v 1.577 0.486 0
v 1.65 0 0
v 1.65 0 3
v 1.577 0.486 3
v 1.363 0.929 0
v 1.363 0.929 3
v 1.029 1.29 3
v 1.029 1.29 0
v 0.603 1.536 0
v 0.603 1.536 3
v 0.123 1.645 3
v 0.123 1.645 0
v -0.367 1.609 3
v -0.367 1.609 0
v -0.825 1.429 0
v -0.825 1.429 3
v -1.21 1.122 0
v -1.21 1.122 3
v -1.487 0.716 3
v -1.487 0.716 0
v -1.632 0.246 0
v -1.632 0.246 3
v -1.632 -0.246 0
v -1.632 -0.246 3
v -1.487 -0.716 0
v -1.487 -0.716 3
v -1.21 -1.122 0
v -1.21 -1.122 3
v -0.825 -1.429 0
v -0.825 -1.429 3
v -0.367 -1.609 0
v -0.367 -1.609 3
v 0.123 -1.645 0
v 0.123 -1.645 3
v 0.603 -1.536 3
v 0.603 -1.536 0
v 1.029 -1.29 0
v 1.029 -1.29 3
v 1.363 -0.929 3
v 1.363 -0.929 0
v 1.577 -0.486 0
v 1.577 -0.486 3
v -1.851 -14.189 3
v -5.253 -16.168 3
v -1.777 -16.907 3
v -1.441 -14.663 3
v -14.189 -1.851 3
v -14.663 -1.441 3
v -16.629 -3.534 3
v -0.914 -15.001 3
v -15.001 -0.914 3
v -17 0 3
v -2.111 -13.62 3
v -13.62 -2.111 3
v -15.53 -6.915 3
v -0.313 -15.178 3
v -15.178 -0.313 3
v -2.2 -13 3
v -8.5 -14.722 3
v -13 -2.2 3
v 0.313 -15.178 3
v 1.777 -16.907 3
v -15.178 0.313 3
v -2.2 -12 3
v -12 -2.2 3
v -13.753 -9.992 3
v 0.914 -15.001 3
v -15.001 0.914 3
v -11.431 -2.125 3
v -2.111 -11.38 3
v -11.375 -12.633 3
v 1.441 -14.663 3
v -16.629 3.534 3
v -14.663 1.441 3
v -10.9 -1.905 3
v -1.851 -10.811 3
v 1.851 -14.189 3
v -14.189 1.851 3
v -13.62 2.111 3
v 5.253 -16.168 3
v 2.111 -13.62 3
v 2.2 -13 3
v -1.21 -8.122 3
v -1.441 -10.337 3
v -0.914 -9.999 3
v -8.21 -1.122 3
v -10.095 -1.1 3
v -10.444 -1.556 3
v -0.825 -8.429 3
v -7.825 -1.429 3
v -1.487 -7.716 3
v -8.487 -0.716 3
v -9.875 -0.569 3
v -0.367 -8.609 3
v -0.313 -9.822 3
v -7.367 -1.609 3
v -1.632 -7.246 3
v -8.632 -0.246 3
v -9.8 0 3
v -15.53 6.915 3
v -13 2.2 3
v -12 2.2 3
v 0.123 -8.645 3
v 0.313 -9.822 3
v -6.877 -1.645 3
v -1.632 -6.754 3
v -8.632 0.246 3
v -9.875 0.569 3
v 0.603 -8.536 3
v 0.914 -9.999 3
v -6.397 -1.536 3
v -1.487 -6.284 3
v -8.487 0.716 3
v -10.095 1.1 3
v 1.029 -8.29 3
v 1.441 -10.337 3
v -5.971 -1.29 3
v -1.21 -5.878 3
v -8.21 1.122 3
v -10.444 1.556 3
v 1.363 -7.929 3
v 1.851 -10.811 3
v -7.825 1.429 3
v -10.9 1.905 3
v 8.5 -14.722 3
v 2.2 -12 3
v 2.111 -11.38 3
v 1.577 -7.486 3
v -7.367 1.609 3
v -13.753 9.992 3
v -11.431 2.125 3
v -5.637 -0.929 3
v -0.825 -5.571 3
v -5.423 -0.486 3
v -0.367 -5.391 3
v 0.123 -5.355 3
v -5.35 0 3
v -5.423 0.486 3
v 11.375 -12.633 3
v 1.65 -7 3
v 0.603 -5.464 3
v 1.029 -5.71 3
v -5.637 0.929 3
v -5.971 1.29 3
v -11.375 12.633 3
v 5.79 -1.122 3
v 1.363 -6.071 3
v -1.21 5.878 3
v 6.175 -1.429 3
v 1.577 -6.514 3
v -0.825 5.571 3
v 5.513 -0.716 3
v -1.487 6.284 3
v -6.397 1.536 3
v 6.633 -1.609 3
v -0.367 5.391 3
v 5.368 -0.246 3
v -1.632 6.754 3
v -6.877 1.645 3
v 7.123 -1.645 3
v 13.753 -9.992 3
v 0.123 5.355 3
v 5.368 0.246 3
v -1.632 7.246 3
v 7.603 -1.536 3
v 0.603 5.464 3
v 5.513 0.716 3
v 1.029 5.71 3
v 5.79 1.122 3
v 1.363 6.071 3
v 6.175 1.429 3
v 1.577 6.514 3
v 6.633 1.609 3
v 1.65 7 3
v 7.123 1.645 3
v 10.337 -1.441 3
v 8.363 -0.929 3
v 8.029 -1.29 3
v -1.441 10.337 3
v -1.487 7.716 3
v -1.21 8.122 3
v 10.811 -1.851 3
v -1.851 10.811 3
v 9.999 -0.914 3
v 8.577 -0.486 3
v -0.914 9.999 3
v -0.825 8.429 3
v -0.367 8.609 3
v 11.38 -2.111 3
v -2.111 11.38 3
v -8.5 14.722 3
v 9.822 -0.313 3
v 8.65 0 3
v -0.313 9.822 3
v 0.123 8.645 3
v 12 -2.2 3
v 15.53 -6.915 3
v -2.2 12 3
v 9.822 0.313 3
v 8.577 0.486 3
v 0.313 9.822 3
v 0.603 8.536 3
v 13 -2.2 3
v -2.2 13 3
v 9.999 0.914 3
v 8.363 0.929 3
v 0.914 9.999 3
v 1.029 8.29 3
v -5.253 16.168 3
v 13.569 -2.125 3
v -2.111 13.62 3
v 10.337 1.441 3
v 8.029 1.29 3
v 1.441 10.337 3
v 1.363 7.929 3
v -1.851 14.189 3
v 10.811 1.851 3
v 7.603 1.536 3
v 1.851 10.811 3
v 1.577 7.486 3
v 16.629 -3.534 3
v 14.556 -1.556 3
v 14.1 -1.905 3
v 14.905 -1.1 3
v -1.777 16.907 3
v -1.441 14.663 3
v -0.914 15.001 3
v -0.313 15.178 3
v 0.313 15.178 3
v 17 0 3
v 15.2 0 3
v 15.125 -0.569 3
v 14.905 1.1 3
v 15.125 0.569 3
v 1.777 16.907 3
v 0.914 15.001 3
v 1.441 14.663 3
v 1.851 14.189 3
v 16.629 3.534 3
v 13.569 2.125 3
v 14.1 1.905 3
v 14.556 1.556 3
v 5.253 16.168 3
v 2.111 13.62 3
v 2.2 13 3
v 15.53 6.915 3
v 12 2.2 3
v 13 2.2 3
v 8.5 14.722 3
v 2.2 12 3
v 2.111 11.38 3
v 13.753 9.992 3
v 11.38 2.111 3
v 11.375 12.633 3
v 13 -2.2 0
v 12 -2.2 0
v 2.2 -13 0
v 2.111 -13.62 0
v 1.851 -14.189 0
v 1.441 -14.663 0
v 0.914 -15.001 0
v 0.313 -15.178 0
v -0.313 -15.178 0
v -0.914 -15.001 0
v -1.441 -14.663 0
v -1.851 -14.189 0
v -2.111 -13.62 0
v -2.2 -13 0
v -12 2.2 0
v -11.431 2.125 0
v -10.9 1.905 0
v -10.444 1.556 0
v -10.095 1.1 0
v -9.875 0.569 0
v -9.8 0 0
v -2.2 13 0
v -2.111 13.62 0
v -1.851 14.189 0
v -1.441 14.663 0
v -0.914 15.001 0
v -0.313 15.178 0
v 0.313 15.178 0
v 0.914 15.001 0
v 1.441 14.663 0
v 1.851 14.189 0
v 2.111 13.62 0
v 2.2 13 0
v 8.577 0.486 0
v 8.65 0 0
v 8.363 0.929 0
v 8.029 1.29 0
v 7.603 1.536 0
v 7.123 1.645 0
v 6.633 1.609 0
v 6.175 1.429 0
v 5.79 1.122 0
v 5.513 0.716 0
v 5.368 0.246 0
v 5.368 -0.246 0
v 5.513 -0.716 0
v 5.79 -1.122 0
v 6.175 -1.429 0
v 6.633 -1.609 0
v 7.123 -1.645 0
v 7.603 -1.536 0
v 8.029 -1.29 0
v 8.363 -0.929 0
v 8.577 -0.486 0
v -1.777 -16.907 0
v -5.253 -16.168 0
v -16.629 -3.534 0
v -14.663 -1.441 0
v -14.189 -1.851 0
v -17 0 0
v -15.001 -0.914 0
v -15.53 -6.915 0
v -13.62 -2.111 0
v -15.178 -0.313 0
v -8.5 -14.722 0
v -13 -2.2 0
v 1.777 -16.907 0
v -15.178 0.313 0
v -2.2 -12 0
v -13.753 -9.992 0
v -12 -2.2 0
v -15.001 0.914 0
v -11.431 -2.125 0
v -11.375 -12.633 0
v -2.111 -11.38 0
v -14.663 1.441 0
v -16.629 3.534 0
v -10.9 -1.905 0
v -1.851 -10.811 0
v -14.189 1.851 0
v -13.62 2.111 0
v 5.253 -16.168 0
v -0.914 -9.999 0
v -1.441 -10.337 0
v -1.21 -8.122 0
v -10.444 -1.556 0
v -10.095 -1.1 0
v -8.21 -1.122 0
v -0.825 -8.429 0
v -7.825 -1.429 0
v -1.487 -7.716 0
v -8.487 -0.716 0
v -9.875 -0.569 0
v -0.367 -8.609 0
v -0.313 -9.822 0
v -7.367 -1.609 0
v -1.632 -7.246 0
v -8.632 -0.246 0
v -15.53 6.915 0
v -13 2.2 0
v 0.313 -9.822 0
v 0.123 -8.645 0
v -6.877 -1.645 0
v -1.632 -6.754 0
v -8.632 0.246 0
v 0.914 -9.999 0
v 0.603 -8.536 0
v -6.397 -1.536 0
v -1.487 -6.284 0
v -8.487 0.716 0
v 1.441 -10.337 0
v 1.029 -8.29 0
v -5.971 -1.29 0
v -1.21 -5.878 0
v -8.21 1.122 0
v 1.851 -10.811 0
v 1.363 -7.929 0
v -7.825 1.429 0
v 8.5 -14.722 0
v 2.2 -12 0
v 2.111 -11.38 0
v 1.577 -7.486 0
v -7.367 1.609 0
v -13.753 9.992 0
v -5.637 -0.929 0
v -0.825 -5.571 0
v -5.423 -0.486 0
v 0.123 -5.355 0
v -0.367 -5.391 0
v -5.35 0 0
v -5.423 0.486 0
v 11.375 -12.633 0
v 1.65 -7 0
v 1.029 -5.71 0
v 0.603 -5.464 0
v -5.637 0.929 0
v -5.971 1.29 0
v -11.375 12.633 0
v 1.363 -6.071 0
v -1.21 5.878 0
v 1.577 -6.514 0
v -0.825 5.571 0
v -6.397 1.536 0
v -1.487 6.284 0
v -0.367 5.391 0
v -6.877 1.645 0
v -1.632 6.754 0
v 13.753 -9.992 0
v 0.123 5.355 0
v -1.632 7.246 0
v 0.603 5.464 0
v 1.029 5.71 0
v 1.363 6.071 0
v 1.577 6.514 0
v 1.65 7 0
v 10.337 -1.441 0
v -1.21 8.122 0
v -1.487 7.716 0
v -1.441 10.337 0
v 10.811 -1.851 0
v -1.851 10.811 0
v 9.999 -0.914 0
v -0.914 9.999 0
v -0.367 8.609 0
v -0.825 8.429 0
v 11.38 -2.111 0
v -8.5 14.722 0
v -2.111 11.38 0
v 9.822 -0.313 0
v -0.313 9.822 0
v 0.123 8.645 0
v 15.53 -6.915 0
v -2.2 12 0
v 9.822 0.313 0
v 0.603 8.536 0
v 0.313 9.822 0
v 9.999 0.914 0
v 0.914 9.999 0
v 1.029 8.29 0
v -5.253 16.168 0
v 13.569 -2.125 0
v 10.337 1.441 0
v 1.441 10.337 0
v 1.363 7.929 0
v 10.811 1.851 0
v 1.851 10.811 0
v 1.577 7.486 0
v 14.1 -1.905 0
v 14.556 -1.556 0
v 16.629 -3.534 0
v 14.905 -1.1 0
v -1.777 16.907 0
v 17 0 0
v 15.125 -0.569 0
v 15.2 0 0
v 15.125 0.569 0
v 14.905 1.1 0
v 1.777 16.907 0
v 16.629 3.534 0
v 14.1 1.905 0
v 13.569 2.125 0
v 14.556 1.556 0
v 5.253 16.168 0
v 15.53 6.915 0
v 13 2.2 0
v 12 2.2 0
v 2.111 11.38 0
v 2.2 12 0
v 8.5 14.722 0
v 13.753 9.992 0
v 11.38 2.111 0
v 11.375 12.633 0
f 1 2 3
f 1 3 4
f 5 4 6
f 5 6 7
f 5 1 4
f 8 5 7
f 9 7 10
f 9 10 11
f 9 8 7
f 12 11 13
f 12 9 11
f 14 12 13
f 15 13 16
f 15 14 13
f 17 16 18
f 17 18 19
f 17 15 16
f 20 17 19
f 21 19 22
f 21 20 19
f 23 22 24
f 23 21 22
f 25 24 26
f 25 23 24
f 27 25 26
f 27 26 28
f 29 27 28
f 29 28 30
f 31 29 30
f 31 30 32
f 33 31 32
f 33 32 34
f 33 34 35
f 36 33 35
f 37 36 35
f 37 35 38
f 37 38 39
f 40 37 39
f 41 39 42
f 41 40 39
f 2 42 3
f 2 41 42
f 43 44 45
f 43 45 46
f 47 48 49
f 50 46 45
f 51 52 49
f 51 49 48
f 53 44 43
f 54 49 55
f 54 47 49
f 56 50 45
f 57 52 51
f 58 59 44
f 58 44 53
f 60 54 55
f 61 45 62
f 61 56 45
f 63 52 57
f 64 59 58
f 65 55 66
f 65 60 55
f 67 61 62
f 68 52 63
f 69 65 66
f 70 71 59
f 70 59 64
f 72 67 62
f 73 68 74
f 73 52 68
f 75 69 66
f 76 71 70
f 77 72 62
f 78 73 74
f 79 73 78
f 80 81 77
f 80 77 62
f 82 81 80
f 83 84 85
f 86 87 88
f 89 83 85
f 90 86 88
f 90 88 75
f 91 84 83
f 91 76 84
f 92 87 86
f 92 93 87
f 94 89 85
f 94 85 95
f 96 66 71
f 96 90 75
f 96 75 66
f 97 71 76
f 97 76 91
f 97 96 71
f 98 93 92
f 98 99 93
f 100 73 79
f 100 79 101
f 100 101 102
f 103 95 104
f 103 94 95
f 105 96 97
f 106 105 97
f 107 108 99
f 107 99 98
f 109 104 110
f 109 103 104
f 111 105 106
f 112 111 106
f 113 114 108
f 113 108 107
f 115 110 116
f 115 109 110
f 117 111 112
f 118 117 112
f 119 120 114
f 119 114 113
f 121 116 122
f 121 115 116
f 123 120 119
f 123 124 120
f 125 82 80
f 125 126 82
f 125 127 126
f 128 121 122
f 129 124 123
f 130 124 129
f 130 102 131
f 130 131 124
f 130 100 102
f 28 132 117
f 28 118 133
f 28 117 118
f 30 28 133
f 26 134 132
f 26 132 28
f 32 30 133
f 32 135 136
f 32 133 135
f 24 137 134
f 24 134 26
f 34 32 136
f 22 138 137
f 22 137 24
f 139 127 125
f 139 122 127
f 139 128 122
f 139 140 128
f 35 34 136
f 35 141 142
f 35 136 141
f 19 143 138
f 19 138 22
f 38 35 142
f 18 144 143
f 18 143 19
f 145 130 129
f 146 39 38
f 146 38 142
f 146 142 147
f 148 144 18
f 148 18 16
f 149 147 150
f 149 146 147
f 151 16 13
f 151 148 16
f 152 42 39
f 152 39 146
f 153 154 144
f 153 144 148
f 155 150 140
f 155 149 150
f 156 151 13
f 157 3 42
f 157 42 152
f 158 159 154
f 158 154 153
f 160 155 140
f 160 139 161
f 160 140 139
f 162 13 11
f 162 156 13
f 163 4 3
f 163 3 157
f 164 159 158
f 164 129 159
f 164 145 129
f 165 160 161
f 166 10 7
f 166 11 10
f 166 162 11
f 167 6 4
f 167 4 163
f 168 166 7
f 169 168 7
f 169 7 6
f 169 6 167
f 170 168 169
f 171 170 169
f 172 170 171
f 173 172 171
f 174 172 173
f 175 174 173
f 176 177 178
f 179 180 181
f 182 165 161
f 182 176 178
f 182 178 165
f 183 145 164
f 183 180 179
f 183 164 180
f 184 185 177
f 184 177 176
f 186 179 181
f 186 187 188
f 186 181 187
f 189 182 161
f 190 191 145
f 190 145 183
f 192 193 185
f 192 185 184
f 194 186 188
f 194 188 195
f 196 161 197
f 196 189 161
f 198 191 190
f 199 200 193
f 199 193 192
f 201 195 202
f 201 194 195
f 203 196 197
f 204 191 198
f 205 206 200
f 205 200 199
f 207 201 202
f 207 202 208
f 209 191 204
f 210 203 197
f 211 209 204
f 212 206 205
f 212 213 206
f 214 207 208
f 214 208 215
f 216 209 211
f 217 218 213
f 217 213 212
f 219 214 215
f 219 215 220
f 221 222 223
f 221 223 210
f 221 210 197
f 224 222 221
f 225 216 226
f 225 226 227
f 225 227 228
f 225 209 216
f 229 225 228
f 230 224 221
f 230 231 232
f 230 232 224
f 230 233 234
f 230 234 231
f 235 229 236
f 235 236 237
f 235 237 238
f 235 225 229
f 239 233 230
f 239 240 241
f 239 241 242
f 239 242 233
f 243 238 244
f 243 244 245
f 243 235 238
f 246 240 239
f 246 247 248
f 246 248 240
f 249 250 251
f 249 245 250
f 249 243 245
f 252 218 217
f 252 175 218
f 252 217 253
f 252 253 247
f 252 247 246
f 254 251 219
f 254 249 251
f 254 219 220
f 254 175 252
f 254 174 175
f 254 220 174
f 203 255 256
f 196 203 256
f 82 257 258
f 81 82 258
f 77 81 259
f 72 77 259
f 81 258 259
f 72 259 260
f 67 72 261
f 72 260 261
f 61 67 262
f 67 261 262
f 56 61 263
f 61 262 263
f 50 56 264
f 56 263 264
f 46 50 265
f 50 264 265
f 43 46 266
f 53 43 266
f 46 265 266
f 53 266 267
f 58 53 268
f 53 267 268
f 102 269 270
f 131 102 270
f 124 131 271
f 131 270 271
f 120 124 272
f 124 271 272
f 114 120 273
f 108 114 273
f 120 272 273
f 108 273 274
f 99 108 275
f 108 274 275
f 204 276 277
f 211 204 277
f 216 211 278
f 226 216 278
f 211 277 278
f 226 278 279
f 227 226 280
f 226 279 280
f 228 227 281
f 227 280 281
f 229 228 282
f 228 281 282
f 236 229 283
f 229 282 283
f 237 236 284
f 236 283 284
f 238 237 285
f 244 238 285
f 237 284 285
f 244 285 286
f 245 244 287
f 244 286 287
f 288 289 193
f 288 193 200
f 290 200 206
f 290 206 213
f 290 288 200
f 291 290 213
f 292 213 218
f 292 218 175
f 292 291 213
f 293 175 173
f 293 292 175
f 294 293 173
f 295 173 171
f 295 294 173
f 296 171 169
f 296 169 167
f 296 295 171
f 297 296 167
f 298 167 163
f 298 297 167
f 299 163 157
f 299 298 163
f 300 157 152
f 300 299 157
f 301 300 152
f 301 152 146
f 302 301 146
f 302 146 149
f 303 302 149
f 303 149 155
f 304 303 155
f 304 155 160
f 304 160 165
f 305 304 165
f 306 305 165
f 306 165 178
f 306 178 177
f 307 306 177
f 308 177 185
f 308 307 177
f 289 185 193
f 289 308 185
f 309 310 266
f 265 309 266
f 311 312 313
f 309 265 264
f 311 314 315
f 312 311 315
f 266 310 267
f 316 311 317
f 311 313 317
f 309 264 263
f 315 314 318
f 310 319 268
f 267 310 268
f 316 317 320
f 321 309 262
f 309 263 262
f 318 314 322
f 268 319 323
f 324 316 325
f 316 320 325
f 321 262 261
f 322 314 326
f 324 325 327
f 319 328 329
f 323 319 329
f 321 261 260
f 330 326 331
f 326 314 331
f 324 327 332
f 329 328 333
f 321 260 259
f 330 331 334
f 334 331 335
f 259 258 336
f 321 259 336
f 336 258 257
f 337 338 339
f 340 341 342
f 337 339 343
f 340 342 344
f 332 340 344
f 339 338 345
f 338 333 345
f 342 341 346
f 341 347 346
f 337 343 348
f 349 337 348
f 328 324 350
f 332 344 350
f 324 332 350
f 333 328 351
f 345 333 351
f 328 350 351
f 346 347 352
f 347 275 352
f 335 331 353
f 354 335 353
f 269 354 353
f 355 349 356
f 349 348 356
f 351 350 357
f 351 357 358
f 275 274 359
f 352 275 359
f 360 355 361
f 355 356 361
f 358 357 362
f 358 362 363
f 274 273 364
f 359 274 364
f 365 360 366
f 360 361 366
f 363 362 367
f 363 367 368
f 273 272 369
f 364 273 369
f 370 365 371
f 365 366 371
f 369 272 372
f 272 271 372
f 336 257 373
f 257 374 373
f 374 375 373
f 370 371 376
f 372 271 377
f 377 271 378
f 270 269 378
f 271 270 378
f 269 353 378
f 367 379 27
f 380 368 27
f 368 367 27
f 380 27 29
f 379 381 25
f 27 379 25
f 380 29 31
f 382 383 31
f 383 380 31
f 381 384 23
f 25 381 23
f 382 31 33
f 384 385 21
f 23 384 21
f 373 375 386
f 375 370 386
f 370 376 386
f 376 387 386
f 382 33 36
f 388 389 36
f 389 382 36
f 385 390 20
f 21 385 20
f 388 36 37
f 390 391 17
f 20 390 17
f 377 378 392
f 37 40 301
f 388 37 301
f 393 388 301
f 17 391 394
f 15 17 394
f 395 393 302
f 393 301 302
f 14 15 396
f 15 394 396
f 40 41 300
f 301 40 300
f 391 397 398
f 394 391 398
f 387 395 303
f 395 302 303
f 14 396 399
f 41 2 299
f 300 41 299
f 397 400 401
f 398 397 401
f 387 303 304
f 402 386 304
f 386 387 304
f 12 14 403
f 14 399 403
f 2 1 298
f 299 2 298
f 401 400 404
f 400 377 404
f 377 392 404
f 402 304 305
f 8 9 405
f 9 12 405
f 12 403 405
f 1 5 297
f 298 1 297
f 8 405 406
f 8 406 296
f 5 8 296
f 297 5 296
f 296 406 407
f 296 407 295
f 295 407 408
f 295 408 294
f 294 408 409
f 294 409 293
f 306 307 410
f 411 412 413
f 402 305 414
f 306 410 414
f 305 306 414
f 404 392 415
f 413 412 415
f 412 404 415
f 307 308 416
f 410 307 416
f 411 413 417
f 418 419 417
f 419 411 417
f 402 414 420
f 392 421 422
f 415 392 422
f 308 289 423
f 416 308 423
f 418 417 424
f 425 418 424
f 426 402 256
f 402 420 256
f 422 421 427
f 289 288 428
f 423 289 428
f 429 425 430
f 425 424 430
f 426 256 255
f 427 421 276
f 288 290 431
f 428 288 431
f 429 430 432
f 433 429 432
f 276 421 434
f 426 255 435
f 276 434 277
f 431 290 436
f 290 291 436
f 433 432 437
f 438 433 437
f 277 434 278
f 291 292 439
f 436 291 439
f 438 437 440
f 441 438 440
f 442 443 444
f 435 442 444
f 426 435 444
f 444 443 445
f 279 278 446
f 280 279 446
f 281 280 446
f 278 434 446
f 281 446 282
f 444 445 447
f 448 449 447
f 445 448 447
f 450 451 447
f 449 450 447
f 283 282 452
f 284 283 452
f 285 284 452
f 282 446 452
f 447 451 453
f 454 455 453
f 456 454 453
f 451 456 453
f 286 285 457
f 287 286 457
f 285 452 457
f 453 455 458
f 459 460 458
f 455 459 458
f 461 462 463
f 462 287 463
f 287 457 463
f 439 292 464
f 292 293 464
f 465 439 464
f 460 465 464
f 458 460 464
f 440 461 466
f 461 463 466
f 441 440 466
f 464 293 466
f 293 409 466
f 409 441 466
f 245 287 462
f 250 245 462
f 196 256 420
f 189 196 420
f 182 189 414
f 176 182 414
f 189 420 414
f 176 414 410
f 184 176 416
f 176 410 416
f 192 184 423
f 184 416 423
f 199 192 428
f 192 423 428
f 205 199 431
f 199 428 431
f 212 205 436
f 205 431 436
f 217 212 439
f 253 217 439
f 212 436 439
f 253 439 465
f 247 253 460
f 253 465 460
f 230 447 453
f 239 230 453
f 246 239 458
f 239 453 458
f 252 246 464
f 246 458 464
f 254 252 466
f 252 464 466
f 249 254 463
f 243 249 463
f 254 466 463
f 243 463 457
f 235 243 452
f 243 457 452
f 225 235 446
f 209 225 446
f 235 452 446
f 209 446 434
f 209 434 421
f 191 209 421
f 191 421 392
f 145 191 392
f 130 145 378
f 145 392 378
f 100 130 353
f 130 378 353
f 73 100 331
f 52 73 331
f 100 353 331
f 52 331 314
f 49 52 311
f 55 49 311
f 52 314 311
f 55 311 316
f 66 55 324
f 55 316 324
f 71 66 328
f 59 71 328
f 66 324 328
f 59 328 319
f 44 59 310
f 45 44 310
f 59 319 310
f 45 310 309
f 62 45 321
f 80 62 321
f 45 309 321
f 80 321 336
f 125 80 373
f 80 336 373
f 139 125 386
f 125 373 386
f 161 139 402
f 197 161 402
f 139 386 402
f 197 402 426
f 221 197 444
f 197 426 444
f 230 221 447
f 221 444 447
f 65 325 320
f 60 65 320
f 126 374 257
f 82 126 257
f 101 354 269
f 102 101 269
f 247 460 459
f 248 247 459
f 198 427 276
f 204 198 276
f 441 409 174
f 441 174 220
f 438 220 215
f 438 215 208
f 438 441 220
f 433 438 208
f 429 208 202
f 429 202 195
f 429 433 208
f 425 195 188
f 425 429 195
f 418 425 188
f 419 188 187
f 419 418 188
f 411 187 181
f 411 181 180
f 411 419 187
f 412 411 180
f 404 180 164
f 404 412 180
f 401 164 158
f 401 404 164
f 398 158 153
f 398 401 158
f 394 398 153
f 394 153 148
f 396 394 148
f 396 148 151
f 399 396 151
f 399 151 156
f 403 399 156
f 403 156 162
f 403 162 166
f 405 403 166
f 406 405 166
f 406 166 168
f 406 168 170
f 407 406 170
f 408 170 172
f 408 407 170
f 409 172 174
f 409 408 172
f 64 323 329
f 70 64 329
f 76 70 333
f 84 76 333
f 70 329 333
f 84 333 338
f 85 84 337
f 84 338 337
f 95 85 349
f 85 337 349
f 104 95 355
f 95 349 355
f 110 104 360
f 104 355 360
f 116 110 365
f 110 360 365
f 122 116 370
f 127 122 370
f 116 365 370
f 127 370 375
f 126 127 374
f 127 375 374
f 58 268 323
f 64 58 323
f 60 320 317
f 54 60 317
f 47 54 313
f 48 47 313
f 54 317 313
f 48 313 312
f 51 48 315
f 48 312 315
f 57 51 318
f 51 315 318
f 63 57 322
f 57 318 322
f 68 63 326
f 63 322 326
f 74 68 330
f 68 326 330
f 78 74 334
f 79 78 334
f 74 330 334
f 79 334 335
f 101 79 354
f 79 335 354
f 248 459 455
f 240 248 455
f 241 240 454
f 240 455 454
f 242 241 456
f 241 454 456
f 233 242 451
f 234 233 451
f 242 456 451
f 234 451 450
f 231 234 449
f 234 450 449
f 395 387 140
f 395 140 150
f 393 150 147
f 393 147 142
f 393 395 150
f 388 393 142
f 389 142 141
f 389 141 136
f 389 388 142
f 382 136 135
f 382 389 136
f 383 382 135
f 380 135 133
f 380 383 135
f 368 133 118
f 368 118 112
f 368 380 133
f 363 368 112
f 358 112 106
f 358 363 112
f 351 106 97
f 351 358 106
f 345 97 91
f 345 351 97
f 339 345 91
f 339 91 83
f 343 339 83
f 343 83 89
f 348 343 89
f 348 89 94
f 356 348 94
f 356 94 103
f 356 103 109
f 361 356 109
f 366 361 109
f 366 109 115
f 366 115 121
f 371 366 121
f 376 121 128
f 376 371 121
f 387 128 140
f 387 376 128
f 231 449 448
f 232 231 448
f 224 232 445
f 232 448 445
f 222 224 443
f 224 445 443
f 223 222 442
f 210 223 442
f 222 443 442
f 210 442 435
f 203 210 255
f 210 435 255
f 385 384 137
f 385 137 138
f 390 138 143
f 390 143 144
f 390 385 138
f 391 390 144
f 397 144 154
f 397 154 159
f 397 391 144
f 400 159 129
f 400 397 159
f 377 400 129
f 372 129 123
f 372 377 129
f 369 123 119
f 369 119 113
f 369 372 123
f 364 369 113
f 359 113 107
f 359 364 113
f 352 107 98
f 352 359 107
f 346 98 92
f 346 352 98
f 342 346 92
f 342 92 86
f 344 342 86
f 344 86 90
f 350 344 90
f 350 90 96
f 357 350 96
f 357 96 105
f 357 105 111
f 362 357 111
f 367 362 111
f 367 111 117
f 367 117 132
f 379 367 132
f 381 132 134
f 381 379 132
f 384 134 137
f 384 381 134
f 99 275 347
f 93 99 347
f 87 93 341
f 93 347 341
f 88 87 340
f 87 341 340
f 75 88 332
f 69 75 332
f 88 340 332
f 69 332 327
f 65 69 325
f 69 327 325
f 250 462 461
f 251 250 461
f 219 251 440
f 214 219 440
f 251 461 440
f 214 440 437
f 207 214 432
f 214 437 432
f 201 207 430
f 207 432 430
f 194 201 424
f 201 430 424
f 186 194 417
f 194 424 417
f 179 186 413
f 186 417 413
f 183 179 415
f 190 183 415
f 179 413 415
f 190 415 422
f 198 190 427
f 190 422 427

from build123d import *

# Parameters (mm, degrees)
SKETCH_1_R      = 17
SKETCH_1_R_2    = 1.65
EXTRUDE_1_DEPTH = 3


with BuildPart() as part:
    # 草图1 → 凸台-拉伸1 (new body)
    with BuildSketch(Plane.XY):
        Circle(SKETCH_1_R)
        with BuildLine():
            ThreePointArc((2.2, -13), (0, -15.2), (-2.2, -13))
            Line((-2.2, -13), (-2.2, -12))
            ThreePointArc((-2.2, -12), (0, -9.8), (2.2, -12))
            Line((2.2, -12), (2.2, -13))
        make_face(mode=Mode.SUBTRACT)
        with Locations((0, -7)):
            Circle(SKETCH_1_R_2, mode=Mode.SUBTRACT)
        with BuildLine():
            ThreePointArc((-13, -2.2), (-15.2, 0), (-13, 2.2))
            Line((-13, 2.2), (-12, 2.2))
            ThreePointArc((-12, 2.2), (-10.444365081, 1.555634919), (-9.8, 0))
            ThreePointArc((-9.8, 0), (-10.444365081, -1.555634919), (-12, -2.2))
            Line((-12, -2.2), (-13, -2.2))
        make_face(mode=Mode.SUBTRACT)
        with Locations((-7, 0)):
            Circle(SKETCH_1_R_2, mode=Mode.SUBTRACT)
        Circle(SKETCH_1_R_2, mode=Mode.SUBTRACT)
        with Locations((7, 0)):
            Circle(SKETCH_1_R_2, mode=Mode.SUBTRACT)
        with Locations((0, 7)):
            Circle(SKETCH_1_R_2, mode=Mode.SUBTRACT)
        with BuildLine():
            Line((13, -2.2), (12, -2.2))
            ThreePointArc((12, -2.2), (9.8, 0), (12, 2.2))
            Line((12, 2.2), (13, 2.2))
            ThreePointArc((13, 2.2), (14.555634919, 1.555634919), (15.2, 0))
            ThreePointArc((15.2, 0), (14.555634919, -1.555634919), (13, -2.2))
        make_face(mode=Mode.SUBTRACT)
        with BuildLine():
            Line((-2.2, 12), (-2.2, 13))
            ThreePointArc((-2.2, 13), (0, 15.2), (2.2, 13))
            Line((2.2, 13), (2.2, 12))
            ThreePointArc((2.2, 12), (0, 9.8), (-2.2, 12))
        make_face(mode=Mode.SUBTRACT)
    extrude(amount=EXTRUDE_1_DEPTH)


solid = part.part
